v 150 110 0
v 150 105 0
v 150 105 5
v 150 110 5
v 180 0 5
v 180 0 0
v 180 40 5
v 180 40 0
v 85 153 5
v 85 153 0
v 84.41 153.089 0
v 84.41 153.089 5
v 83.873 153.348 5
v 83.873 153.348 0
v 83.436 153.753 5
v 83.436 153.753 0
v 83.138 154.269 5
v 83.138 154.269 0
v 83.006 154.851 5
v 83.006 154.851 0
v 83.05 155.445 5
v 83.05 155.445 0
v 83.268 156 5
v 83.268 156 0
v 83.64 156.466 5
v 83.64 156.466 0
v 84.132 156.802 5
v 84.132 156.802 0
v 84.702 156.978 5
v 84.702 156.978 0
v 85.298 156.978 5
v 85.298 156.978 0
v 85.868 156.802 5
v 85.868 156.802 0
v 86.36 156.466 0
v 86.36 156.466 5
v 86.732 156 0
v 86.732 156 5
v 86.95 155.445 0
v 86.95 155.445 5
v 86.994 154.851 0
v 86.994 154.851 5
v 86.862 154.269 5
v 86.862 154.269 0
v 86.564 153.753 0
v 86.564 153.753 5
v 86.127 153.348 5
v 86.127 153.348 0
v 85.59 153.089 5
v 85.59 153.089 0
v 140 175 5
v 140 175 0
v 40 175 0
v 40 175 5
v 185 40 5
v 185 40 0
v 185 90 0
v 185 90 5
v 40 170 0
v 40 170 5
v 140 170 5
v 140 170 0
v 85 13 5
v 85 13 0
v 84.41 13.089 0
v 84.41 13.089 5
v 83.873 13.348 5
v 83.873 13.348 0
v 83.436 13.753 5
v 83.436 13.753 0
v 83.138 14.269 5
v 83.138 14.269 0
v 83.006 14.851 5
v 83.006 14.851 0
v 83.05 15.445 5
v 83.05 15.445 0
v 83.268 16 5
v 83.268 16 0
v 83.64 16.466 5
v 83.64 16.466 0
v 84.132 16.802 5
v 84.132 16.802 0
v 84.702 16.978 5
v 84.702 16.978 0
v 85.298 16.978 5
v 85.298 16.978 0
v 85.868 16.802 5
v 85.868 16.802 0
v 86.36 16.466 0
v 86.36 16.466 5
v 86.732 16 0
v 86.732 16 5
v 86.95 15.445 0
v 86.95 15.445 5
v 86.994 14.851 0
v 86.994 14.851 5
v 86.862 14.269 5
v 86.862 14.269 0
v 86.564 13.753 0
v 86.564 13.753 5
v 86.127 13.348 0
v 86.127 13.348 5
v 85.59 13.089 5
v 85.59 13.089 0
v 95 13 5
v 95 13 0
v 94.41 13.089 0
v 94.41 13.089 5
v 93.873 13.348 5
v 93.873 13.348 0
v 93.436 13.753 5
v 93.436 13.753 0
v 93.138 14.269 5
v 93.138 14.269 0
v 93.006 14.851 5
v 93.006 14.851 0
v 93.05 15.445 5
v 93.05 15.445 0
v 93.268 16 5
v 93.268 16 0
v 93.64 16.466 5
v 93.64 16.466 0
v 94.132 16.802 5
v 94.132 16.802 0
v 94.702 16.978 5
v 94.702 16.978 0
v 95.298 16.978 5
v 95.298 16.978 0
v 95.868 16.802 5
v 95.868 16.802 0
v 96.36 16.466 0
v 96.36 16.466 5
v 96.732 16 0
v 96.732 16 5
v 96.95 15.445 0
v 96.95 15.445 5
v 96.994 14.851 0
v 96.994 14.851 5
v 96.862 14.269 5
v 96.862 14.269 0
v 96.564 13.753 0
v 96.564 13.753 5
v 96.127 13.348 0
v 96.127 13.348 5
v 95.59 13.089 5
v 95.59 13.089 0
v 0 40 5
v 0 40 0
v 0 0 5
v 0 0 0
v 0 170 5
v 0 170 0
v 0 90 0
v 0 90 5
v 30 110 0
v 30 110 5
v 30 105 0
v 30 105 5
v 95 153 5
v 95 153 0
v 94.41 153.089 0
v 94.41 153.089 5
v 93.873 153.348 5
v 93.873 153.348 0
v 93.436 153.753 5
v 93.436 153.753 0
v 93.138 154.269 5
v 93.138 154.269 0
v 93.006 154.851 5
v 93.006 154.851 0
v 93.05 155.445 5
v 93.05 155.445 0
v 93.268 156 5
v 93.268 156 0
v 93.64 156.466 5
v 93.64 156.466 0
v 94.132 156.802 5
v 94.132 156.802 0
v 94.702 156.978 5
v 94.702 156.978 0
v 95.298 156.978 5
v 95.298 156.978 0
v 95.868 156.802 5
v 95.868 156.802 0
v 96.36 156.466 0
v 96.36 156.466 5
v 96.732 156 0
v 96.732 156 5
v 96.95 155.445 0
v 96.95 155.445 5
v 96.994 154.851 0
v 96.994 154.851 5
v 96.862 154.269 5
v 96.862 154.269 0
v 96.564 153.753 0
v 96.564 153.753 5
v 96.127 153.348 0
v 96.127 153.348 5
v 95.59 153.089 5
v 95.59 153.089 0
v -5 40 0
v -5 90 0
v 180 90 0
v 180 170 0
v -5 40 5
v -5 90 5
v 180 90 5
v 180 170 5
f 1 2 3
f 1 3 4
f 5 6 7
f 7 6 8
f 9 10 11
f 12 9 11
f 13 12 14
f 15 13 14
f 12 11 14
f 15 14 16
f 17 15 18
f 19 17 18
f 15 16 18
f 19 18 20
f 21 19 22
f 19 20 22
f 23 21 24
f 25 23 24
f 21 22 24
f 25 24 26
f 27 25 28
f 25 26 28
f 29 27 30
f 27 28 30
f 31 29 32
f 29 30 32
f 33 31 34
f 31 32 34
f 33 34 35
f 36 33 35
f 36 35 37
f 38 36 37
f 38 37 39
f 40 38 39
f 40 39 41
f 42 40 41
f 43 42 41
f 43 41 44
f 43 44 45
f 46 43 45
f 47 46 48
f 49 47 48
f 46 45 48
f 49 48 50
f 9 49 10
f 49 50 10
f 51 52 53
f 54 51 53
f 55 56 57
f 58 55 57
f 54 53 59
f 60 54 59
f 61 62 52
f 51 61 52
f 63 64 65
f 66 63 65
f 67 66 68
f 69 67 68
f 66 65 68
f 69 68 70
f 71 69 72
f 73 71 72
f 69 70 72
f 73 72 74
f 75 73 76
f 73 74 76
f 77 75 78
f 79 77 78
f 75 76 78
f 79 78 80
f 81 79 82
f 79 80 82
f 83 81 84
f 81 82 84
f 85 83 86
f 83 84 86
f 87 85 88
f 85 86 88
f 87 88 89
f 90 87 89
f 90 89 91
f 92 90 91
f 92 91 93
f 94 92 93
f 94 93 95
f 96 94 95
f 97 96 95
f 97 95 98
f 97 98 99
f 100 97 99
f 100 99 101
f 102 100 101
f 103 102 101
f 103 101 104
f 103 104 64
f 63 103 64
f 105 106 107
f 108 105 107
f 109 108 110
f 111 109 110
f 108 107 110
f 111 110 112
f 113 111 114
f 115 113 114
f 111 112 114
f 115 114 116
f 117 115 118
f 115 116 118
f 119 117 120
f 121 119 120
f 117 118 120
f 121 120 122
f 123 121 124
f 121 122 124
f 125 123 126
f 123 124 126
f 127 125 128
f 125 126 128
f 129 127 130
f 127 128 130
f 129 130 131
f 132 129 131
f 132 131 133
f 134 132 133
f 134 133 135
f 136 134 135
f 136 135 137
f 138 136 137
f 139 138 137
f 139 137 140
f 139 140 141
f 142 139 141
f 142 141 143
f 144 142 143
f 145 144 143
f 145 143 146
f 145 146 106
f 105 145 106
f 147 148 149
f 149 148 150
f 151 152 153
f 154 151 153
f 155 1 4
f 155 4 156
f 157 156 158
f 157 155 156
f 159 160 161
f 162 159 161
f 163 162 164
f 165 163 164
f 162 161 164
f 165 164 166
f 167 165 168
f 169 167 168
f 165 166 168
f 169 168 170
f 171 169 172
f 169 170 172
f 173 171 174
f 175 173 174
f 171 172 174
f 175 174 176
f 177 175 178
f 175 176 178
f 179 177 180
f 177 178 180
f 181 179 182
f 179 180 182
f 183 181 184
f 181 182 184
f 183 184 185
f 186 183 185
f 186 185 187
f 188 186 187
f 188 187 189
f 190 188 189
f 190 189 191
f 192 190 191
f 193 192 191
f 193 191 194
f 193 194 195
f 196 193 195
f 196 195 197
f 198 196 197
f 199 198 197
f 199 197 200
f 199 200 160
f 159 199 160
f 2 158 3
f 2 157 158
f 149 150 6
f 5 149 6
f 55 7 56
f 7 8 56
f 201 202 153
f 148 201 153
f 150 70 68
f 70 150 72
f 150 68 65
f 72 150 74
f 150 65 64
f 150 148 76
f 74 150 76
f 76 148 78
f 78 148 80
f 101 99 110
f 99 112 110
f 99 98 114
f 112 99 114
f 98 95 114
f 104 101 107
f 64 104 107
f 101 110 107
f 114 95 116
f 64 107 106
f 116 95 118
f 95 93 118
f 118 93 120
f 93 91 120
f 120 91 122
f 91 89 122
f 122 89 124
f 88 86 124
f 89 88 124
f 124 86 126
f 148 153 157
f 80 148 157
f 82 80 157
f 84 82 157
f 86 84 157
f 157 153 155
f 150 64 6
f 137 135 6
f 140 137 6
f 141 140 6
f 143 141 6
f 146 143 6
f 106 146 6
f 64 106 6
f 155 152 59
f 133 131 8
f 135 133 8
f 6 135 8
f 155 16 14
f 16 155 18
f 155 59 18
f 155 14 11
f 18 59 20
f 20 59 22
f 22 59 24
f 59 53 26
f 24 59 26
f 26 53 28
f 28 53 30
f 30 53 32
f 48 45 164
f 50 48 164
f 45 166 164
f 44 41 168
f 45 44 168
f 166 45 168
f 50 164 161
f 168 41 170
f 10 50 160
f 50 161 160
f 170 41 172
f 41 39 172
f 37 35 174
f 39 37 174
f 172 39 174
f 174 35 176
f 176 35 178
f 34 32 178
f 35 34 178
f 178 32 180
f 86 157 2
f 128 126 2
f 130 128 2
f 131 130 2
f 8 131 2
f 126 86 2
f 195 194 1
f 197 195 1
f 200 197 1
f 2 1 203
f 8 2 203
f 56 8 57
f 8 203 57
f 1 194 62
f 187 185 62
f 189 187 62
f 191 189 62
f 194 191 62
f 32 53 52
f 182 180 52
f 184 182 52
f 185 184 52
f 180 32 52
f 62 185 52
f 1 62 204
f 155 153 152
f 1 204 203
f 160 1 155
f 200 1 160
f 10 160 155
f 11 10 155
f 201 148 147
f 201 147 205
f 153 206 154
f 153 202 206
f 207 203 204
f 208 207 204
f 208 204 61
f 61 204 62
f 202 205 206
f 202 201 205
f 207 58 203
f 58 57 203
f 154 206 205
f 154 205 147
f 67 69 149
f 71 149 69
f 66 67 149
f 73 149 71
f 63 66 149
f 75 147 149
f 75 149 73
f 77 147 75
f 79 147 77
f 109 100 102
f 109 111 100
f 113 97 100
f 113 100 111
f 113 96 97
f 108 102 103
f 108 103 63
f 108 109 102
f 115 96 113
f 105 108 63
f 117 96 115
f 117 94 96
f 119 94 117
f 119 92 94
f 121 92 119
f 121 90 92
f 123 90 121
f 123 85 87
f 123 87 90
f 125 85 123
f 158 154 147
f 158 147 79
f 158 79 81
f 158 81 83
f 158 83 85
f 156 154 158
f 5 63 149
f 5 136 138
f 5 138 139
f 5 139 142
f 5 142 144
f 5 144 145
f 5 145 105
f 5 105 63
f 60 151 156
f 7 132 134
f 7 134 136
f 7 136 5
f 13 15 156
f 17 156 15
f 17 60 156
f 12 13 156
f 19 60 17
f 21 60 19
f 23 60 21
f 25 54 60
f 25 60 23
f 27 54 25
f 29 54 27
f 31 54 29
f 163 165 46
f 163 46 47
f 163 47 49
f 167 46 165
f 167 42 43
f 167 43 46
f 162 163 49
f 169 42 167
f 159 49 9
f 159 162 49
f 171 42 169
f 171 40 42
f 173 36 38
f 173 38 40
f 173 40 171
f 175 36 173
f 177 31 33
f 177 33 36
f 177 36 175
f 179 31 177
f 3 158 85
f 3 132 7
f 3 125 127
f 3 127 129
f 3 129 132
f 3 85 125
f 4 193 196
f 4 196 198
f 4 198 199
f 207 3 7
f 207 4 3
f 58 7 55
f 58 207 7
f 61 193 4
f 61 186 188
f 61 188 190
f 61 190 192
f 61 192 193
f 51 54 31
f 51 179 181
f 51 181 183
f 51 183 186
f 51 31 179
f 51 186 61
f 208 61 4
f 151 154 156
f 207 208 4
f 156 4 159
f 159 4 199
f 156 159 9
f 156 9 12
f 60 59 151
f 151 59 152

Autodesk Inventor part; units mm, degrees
ref_plane "YZ Plane" through (0, 0, 0) normal (1, 0, 0) x (0, 1, 0)
ref_plane "XZ Plane" through (0, 0, 0) normal (0, 1, 0) x (-1, 0, 0)
ref_plane "XY Plane" through (0, 0, 0) normal (0, 0, 1) x (1, 0, 0)
sketch "Sketch1" plane through (0, 0, 0) normal (0, 0, 1) x (1, 0, 0)
  line L0 (0, 0) -> (180, 0)
  line L1 (180, 0) -> (180, 170)
  line L2 (180, 170) -> (0, 170)
  line L3 (0, 170) -> (0, 0)
  line L4 (0, 40) -> (-5, 40)
  line L5 (-5, 40) -> (-5, 90)
  line L6 (-5, 90) -> (0, 90)
  line L7 (0, 90) -> (0, 40)
  line L8 (90, 0) -> (90, 170) construction
  line L9 (180, 40) -> (185, 40)
  line L10 (185, 40) -> (185, 90)
  line L11 (185, 90) -> (180, 90)
  line L12 (180, 90) -> (180, 40)
  line L13 (30, 105) -> (150, 105)
  line L14 (150, 105) -> (150, 110)
  line L15 (150, 110) -> (30, 110)
  line L16 (30, 110) -> (30, 105)
  line L17 (0, 65) -> (180, 65) construction
  line L18 (40, 170) -> (140, 170)
  line L19 (140, 170) -> (140, 175)
  line L20 (140, 175) -> (40, 175)
  line L21 (40, 175) -> (40, 170)
  point P0 (180, 40)
  point P1 (180, 90)
  point P2 (0, 90)
  point P3 (40, 0)
  point P4 (30, 107.5)
  dimension "d0" = 180
  dimension "d1" = 170
  dimension "d2" = 5
  dimension "d3" = 50
  dimension "d6" = 120
  dimension "d7" = 5
  dimension "d13" = 60
  dimension "d14" = 60
  dimension "d30" = 100
  dimension "d31" = 5
  dimension "d32" = 40
extrude "Extrusion1" add sketch "Sketch1" along normal blind 5
sketch "Sketch2" plane through (0, 0, 5) normal (0, 0, 1) x (1, 0, 0)
  line L0 (180, 170) -> (0, 170) projected
  line L1 (0, 0) -> (180, 0) projected
  line L2 (0, 170) -> (0, 90) projected
  line L3 (0, 40) -> (0, 0) projected
  point P0 (85, 15)
  point P1 (95, 15)
  dimension "d24" = 15
  dimension "d25" = 15
  dimension "d26" = 10
  dimension "d29" = 85
hole "Hole1" at (85, 15, 5) at (95, 15, 5) direction (0, 0, -1) diameter 4 end through all
sketch "Sketch3" plane through (0, 0, 5) normal (0, 0, 1) x (1, 0, 0)
  line L0 (140, 175) -> (40, 175) projected
  line L1 (40, 175) -> (40, 170) projected
  point P0 (0, 0)
  point P1 (85, 155)
  point P2 (95, 155)
  dimension "d40" = 20
  dimension "d41" = 20
  dimension "d42" = 10
  dimension "d43" = 45
hole "Hole2" at (85, 155, 5) at (95, 155, 5) direction (0, 0, -1) diameter 4 end through all
properties part number "back"
